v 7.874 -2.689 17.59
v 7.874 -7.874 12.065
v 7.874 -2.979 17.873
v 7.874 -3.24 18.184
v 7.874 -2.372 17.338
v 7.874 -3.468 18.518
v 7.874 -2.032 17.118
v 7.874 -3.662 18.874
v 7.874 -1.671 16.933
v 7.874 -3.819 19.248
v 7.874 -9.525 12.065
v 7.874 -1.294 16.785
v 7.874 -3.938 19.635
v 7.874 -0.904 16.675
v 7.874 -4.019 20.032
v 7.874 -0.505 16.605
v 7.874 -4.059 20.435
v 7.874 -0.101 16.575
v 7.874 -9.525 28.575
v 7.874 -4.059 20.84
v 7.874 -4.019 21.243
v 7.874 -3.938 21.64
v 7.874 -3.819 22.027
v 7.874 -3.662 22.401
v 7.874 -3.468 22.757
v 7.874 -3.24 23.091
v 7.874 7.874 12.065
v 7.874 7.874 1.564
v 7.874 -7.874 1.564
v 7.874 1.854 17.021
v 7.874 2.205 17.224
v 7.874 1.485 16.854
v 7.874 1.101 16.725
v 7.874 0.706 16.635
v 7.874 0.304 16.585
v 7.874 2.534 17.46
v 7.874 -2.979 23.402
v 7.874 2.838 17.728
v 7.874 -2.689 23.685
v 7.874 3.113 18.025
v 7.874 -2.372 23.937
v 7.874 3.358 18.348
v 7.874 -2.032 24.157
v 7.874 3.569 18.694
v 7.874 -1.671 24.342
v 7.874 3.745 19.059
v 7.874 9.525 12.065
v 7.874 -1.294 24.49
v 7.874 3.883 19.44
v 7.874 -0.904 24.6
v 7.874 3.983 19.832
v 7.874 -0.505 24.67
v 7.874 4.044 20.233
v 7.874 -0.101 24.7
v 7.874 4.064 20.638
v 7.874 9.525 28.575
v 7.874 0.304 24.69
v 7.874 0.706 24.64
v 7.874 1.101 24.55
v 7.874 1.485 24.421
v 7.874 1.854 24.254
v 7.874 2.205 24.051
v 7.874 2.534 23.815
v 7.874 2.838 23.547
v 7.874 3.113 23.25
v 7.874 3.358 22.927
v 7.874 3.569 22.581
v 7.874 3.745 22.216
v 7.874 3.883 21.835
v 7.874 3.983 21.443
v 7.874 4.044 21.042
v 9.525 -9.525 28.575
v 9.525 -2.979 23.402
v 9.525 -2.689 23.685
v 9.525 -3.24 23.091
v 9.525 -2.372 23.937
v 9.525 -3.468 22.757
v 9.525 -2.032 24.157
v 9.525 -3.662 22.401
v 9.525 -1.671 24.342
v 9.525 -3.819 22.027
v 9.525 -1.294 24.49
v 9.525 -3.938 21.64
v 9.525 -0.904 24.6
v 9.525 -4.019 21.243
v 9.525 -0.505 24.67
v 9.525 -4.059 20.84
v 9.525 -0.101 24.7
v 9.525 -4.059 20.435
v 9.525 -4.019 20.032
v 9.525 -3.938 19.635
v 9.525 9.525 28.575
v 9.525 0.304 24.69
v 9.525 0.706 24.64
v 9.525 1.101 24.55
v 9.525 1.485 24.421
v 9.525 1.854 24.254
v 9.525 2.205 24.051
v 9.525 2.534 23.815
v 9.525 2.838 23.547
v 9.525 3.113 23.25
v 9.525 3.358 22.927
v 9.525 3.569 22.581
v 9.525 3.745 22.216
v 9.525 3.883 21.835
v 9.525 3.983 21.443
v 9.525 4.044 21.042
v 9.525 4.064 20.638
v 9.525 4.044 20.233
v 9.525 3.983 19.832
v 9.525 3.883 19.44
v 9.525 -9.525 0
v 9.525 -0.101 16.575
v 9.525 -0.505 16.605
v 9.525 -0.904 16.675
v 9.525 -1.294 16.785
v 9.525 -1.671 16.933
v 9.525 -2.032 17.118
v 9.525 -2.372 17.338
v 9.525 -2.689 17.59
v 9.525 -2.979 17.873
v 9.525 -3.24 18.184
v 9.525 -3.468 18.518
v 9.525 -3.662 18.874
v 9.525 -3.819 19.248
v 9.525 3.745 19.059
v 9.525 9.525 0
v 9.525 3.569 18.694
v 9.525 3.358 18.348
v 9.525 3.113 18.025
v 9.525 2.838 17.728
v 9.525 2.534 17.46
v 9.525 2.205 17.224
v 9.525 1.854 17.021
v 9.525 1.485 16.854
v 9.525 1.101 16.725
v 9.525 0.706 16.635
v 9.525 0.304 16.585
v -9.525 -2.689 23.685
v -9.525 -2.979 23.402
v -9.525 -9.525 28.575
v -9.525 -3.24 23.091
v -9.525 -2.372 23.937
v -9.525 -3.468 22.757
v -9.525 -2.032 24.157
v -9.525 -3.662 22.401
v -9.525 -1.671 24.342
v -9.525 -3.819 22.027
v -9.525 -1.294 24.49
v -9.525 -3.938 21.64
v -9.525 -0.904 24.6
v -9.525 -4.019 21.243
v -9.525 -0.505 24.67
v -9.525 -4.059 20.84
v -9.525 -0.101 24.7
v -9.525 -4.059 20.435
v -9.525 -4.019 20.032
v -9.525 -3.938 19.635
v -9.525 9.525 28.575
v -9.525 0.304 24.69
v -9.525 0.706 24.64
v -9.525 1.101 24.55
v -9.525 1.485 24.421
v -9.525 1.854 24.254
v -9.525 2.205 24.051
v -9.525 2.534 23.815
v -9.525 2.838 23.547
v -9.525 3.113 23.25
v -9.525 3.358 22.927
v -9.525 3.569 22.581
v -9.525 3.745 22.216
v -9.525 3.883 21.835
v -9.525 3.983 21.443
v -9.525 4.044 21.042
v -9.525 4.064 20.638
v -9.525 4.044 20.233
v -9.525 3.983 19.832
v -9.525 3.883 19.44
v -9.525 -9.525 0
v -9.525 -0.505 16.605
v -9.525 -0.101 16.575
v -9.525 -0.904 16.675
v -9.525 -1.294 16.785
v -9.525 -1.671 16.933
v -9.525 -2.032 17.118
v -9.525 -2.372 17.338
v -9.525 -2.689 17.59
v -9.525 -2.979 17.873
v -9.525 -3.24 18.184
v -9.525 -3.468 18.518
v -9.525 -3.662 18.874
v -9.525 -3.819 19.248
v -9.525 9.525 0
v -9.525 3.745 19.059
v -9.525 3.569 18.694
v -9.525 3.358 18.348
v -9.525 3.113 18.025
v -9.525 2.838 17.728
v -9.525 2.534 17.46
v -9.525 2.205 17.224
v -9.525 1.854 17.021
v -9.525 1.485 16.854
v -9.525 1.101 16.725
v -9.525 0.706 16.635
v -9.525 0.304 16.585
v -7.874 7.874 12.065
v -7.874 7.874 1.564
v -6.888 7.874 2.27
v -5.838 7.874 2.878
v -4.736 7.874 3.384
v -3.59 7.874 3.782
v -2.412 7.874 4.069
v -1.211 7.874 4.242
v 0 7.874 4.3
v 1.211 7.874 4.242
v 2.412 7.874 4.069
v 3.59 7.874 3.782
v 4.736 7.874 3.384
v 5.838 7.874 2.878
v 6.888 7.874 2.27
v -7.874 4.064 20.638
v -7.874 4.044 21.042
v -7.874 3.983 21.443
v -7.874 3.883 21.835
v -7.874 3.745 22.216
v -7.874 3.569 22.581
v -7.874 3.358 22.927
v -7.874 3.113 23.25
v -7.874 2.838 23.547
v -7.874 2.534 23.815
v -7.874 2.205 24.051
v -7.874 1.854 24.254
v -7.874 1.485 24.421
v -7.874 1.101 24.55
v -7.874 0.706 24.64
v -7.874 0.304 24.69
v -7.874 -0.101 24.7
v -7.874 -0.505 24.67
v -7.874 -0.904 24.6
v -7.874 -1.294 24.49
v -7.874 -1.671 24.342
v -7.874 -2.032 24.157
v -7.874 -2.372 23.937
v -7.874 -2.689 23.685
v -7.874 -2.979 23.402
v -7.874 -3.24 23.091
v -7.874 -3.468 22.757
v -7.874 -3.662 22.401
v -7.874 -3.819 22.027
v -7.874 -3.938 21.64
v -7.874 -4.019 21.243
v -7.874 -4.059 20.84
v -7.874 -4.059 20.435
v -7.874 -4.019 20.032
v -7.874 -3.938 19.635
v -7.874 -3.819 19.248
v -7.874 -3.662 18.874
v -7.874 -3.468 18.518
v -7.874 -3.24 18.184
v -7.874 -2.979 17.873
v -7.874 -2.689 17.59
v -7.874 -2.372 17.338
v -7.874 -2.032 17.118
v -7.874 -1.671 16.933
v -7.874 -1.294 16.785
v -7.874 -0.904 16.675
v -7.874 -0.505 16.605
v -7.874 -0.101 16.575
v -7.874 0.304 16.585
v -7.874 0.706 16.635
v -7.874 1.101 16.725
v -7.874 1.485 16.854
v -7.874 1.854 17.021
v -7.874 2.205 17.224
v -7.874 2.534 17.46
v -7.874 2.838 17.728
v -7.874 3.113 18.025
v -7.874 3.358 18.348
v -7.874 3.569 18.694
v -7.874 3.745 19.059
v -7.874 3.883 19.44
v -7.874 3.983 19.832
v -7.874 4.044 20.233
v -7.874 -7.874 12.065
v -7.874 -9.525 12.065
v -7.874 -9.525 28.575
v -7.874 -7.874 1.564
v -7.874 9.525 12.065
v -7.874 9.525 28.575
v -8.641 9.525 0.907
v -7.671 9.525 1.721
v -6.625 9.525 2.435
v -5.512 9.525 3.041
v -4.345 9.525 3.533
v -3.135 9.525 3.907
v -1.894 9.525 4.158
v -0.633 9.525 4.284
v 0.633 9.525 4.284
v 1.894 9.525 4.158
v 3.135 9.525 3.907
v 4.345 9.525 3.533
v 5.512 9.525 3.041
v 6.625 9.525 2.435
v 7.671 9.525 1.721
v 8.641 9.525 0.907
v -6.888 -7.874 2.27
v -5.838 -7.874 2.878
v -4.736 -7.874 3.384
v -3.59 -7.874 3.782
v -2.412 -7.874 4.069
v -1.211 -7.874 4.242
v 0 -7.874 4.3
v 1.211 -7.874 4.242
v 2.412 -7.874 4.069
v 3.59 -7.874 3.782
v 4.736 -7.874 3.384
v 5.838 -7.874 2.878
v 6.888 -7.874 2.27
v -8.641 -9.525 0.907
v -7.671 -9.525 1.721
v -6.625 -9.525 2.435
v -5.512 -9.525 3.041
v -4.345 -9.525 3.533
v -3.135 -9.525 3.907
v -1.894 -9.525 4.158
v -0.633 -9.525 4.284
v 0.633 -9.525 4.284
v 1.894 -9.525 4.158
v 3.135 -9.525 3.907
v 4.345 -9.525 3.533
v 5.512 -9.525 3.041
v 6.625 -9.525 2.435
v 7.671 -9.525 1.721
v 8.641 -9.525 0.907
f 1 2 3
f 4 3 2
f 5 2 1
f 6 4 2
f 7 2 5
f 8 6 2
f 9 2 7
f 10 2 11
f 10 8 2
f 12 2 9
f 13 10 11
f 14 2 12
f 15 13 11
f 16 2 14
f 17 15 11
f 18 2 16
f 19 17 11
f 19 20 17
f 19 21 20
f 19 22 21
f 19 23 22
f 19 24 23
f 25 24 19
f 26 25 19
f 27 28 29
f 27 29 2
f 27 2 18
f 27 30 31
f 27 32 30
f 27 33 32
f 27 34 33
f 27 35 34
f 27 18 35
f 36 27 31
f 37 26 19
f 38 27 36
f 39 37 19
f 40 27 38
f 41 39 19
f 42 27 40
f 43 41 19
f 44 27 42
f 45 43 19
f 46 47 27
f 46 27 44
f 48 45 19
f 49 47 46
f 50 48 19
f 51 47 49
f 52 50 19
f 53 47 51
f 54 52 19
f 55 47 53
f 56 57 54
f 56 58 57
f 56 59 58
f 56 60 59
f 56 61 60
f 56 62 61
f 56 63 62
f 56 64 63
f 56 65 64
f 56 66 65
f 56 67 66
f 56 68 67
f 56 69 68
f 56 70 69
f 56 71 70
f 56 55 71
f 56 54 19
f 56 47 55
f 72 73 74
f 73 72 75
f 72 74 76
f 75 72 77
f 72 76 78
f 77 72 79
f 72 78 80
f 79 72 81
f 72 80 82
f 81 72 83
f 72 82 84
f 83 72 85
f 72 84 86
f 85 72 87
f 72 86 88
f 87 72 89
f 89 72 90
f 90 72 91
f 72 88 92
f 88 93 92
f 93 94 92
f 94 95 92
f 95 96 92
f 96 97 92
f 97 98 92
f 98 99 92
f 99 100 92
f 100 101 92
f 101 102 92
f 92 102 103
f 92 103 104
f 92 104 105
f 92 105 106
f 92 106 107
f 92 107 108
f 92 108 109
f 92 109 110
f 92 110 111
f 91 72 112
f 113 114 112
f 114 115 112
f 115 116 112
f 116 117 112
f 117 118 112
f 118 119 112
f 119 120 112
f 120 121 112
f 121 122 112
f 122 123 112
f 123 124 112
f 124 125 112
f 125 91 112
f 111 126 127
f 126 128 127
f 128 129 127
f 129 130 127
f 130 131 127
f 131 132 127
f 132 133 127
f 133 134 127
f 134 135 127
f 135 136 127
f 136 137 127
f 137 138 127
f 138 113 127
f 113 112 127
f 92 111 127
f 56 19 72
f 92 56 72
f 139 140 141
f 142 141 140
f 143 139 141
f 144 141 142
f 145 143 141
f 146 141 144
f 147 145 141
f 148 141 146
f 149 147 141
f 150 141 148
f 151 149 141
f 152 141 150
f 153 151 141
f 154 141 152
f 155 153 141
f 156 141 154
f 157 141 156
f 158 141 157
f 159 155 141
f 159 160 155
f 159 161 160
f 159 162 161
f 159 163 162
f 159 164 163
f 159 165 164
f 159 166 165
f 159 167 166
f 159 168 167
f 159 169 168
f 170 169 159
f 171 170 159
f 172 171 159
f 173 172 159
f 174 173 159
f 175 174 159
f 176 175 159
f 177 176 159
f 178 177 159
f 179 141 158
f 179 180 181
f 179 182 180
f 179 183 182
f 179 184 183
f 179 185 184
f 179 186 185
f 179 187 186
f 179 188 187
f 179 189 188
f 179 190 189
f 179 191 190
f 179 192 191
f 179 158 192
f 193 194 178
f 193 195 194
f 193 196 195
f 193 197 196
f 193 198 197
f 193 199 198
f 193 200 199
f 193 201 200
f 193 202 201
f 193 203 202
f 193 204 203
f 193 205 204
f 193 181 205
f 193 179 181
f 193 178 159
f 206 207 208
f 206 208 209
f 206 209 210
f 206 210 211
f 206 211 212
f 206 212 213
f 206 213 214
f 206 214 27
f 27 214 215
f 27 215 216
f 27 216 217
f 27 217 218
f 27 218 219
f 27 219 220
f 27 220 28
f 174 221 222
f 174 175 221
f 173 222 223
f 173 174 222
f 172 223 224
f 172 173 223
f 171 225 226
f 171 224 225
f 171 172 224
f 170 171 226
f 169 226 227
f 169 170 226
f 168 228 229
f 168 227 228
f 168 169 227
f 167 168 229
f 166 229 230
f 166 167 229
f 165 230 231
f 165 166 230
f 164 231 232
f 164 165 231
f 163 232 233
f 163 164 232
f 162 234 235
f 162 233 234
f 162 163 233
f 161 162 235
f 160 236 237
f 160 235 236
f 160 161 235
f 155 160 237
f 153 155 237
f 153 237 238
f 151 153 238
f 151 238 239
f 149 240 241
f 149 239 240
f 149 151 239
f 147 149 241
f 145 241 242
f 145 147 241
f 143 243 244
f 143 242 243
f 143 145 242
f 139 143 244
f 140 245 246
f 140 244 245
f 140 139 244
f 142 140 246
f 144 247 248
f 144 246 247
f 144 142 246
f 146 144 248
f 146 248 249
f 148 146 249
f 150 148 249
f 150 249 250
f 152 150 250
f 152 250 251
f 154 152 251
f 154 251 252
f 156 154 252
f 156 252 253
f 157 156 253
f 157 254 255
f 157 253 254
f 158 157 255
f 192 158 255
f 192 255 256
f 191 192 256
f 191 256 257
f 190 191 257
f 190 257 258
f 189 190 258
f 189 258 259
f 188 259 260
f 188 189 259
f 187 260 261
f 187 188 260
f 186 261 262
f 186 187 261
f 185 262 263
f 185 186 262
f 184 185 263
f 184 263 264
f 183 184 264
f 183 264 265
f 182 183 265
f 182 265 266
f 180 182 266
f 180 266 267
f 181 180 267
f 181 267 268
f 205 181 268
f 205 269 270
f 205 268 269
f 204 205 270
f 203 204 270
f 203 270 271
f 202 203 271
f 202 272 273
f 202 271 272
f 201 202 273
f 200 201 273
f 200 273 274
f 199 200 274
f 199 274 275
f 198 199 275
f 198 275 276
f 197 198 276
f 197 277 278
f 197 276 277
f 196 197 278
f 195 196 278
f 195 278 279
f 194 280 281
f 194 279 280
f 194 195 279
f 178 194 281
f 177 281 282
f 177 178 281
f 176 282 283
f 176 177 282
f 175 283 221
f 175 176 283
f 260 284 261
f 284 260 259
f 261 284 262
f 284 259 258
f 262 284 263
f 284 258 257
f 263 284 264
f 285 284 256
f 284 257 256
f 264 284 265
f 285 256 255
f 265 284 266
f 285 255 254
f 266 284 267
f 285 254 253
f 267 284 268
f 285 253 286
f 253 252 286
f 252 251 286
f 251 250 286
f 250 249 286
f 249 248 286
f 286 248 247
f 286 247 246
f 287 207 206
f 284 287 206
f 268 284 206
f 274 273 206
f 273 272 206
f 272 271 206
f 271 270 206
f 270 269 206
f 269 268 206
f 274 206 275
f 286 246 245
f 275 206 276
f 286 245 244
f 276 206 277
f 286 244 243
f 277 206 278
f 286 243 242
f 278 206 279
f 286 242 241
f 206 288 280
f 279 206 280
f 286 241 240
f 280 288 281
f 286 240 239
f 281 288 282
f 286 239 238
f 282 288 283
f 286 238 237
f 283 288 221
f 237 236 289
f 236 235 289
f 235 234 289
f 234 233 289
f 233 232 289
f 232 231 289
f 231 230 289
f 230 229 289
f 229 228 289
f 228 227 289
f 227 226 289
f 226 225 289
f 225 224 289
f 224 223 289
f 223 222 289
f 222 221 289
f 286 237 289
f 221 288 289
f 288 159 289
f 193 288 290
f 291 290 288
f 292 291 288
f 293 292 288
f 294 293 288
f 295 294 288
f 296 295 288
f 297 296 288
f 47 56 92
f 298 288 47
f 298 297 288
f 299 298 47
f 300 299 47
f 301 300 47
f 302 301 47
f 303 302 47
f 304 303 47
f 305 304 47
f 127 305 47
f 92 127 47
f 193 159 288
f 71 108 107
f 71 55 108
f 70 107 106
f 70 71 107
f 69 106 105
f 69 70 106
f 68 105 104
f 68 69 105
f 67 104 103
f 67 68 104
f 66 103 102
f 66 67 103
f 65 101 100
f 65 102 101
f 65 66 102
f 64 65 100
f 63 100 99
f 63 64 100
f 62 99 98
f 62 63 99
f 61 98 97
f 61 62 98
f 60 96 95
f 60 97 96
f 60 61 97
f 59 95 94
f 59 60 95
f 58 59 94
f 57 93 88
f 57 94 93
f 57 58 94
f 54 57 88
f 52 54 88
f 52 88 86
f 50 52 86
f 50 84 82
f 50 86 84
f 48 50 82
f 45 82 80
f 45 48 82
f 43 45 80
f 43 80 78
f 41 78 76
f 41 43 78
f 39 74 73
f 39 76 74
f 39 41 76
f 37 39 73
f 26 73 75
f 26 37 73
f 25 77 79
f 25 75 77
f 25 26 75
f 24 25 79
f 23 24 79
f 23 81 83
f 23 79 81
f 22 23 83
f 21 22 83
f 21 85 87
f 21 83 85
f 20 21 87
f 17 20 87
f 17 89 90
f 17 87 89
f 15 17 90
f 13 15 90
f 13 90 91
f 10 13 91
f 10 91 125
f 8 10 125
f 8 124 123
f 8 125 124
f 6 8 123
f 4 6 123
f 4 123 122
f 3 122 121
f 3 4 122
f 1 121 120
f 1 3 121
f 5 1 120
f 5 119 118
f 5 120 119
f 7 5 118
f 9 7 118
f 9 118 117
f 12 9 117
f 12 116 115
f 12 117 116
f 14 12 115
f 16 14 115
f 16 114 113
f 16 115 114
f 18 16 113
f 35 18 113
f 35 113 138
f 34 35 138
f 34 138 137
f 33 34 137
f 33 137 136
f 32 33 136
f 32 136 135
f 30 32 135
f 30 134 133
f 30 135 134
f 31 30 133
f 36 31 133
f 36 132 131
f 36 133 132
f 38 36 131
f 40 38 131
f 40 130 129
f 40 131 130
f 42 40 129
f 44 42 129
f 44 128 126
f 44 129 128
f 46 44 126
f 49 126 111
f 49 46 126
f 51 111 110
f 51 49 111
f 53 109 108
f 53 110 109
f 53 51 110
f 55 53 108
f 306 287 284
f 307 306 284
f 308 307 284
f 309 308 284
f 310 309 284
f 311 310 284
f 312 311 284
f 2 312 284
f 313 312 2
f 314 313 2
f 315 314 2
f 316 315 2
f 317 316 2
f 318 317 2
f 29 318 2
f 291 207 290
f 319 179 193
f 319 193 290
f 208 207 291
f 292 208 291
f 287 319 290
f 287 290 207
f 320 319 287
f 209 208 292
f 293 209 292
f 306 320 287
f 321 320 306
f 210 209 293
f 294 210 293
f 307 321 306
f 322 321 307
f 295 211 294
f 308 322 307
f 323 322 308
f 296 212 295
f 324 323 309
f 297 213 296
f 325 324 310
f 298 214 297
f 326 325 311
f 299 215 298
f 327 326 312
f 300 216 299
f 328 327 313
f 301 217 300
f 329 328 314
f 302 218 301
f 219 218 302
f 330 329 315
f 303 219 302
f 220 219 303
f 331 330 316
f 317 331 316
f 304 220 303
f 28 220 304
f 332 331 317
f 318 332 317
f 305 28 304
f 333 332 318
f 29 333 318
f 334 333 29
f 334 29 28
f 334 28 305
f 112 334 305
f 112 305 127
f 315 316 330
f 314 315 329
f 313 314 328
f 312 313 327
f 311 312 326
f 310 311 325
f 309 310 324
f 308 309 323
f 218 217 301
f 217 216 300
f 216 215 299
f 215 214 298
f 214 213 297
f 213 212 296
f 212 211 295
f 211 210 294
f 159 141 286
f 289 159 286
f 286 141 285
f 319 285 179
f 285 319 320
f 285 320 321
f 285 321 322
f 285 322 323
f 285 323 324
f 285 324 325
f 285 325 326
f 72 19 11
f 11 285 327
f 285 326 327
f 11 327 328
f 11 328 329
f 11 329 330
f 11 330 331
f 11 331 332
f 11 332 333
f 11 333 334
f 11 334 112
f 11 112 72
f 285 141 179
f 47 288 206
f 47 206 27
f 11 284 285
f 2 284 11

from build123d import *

# Parameters (mm, degrees)
SKETCH1_W               = 19.05
SKETCH1_H               = 19.05
SKETCH1_W_2             = 15.748
SKETCH1_H_2             = 15.748
BOSS_EXTRUDE1_DEPTH     = 28.575
CUT_EXTRUDE5_DEPTH      = 36.639286609
CUT_EXTRUDE5_DEPTH_BACK = 36.639286609
SKETCH5_R               = 12.7
CUT_EXTRUDE2_DEPTH      = 36.639286609
CUT_EXTRUDE2_DEPTH_BACK = 36.639286609
SKETCH3_R               = 4.064
CUT_EXTRUDE4_DEPTH      = 36.639286609
CUT_EXTRUDE4_DEPTH_BACK = 36.639286609
SKETCH4_W               = 15.748
SKETCH4_H               = 16.51


with BuildPart() as part:
    # Sketch1 → Boss-Extrude1 (new body)
    with BuildSketch(Plane.XY):
        Rectangle(SKETCH1_W, SKETCH1_H)
        Rectangle(SKETCH1_W_2, SKETCH1_H_2, mode=Mode.SUBTRACT)
    extrude(amount=BOSS_EXTRUDE1_DEPTH)

    # Sketch5 → Cut-Extrude5 (cut, two sides: drawn at the far end of the back side and taken through both)
    with BuildSketch(Plane(origin=(0, 9.525, 0), x_dir=(1, 0, 0), z_dir=(0, 1, 0)).offset(-CUT_EXTRUDE5_DEPTH_BACK)):
        with Locations((0, 8.400260413)):
            Circle(SKETCH5_R)
    extrude(amount=CUT_EXTRUDE5_DEPTH + CUT_EXTRUDE5_DEPTH_BACK, mode=Mode.SUBTRACT)

    # Sketch3 → Cut-Extrude2 (cut, two sides: drawn at the far end of the back side and taken through both)
    with BuildSketch(Plane(origin=(9.525, 0, 0), x_dir=(0, 0, -1), z_dir=(1, 0, 0)).offset(-CUT_EXTRUDE2_DEPTH_BACK)):
        with Locations((-20.6375, 0)):
            Circle(SKETCH3_R)
    extrude(amount=CUT_EXTRUDE2_DEPTH + CUT_EXTRUDE2_DEPTH_BACK, mode=Mode.SUBTRACT)

    # Sketch4 → Cut-Extrude4 (cut, two sides: drawn at the far end of the back side and taken through both)
    with BuildSketch(Plane.XZ.offset(9.525).offset(-CUT_EXTRUDE4_DEPTH_BACK)):
        with Locations((0, 20.32)):
            Rectangle(SKETCH4_W, SKETCH4_H)
    extrude(amount=CUT_EXTRUDE4_DEPTH + CUT_EXTRUDE4_DEPTH_BACK, mode=Mode.SUBTRACT)


solid = part.part
